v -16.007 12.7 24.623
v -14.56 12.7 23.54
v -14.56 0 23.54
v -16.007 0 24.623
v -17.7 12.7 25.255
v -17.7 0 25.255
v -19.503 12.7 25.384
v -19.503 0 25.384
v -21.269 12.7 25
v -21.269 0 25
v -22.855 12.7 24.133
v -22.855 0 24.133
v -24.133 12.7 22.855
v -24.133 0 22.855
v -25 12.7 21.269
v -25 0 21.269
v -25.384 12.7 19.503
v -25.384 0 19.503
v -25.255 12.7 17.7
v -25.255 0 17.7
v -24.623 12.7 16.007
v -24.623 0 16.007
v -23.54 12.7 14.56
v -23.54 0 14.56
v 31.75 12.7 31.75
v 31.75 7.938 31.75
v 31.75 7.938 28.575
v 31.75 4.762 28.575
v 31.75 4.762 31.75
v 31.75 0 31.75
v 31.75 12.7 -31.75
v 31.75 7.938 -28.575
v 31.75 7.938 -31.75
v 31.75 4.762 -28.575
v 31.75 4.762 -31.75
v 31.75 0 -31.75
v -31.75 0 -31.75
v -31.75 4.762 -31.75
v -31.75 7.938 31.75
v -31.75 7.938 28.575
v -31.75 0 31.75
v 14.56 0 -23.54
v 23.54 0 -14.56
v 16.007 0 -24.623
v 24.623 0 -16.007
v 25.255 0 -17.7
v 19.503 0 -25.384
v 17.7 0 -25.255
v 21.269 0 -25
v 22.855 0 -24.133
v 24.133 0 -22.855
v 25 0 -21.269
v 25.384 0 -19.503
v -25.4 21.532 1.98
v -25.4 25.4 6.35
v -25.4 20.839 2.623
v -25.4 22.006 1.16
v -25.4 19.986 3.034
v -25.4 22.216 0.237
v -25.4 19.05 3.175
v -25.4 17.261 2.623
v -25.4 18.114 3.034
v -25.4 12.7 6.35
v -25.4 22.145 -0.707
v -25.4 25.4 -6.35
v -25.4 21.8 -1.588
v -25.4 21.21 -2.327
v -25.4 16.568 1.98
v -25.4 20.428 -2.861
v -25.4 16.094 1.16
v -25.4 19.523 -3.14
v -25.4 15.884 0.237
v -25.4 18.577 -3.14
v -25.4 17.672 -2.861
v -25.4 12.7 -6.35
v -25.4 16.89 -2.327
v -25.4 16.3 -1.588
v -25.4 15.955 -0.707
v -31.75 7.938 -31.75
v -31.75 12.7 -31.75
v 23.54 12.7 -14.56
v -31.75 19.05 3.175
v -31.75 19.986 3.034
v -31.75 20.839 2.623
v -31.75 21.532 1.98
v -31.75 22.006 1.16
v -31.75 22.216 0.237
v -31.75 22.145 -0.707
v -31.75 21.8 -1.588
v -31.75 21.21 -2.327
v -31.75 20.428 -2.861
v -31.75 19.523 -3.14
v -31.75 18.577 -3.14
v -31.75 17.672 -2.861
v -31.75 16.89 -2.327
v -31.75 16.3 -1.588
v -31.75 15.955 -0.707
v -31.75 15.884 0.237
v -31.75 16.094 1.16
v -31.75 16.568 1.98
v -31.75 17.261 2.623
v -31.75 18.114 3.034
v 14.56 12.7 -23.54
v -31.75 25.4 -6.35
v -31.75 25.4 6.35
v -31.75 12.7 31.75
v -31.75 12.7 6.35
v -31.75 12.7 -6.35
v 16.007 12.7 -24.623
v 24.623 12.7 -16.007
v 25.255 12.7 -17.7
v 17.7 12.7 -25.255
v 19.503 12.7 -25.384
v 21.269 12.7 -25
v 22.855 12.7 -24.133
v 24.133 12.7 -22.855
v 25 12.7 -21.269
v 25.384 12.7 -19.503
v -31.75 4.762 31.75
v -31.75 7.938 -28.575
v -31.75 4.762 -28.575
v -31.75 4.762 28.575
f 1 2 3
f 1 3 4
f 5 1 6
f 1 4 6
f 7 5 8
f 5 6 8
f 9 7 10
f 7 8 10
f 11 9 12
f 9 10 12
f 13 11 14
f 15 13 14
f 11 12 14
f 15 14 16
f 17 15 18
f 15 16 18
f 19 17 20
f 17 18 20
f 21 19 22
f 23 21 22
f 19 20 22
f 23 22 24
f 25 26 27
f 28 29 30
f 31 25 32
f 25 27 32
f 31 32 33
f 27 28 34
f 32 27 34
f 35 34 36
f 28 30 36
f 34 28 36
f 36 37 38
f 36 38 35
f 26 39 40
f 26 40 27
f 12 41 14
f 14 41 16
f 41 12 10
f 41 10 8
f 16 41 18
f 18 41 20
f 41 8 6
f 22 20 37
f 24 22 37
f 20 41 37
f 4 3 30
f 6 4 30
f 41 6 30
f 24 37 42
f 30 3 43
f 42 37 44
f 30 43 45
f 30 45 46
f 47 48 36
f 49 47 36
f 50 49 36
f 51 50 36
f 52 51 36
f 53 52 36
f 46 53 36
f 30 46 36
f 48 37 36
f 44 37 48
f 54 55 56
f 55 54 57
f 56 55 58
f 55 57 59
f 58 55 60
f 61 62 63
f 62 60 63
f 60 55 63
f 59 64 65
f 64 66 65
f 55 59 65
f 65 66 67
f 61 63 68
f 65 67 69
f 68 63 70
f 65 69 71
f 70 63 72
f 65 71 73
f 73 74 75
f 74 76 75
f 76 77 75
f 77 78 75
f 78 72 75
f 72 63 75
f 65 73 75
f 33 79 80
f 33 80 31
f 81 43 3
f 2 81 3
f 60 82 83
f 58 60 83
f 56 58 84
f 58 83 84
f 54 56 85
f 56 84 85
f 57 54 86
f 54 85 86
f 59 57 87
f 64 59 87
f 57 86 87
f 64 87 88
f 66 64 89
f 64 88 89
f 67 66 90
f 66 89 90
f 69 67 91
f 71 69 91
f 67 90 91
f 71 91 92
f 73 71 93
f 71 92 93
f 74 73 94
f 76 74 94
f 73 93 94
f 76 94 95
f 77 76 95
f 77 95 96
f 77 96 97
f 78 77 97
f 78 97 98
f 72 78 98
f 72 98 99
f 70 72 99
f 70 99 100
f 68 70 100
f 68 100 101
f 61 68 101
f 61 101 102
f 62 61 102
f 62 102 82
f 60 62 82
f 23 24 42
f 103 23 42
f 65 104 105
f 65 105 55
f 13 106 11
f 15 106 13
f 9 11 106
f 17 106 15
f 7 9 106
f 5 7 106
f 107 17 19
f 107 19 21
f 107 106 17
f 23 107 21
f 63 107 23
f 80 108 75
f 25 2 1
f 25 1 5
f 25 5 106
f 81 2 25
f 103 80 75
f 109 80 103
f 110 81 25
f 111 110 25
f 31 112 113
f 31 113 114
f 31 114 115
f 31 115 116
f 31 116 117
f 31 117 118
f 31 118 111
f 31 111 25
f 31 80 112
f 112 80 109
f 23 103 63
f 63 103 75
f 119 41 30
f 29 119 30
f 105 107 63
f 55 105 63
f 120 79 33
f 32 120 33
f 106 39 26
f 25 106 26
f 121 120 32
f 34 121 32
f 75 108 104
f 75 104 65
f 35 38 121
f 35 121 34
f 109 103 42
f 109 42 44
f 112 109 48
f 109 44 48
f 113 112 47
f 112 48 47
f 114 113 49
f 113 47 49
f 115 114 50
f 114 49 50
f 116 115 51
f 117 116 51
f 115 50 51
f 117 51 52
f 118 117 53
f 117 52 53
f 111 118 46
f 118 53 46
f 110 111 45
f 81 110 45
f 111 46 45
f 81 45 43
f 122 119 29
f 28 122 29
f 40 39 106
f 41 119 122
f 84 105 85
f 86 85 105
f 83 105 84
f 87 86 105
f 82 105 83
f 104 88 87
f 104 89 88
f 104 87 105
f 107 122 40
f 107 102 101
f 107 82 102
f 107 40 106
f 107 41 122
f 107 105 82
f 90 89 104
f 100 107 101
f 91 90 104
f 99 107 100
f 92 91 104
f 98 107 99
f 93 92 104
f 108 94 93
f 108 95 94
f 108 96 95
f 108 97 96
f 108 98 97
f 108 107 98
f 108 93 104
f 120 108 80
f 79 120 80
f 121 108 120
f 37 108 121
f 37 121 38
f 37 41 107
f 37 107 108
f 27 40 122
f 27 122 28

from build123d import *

# Parameters (mm, degrees)
SKETCH1_W           = 63.5
SKETCH1_H           = 63.5
BOSS_EXTRUDE1_DEPTH = 12.7
SKETCH2_W           = 63.5
SKETCH2_H           = 3.175
CUT_EXTRUDE1_DEPTH  = 3.175
SKETCH3_W           = 6.35
SKETCH3_H           = 12.7
BOSS_EXTRUDE2_DEPTH = 12.7
SKETCH4_R           = 3.175
CUT_EXTRUDE2_DEPTH  = 64.5


with BuildPart() as part:
    # Sketch1 → Boss-Extrude1 (new body)
    with BuildSketch(Plane(origin=(0, 0, 0), x_dir=(1, 0, 0), z_dir=(0, 1, 0))):
        Rectangle(SKETCH1_W, SKETCH1_H)
        with BuildLine():
            Line((-23.540128061, -14.559871939), (14.559871939, 23.540128061))
            ThreePointArc((14.559871939, 23.540128061), (23.540128061, 23.540128061), (23.540128061, 14.559871939))
            Line((23.540128061, 14.559871939), (-14.559871939, -23.540128061))
            ThreePointArc((-14.559871939, -23.540128061), (-23.540128061, -23.540128061), (-23.540128061, -14.559871939))
        make_face(mode=Mode.SUBTRACT)
    extrude(amount=BOSS_EXTRUDE1_DEPTH)

    # Sketch2 → Cut-Extrude1 (cut)
    with BuildSketch(Plane.XY.offset(31.75)):
        with Locations((0, 6.35)):
            Rectangle(SKETCH2_W, SKETCH2_H)
    cut_extrude1 = extrude(amount=-CUT_EXTRUDE1_DEPTH, mode=Mode.SUBTRACT)

    # Mirror1: Cut-Extrude1 across plane
    add(cut_extrude1.mirror(Plane.XY), mode=Mode.SUBTRACT)

    # Sketch3 → Boss-Extrude2 (add)
    with BuildSketch(Plane(origin=(0, 12.7, 0), x_dir=(1, 0, 0), z_dir=(0, 1, 0))):
        with Locations((-28.575, 0)):
            Rectangle(SKETCH3_W, SKETCH3_H)
    extrude(amount=BOSS_EXTRUDE2_DEPTH)

    # Sketch4 → Cut-Extrude2 (cut, through all)
    with BuildSketch(Plane.ZY.offset(31.75)):
        with Locations((0, 19.05)):
            Circle(SKETCH4_R)
    extrude(amount=-CUT_EXTRUDE2_DEPTH, mode=Mode.SUBTRACT)


solid = part.part
